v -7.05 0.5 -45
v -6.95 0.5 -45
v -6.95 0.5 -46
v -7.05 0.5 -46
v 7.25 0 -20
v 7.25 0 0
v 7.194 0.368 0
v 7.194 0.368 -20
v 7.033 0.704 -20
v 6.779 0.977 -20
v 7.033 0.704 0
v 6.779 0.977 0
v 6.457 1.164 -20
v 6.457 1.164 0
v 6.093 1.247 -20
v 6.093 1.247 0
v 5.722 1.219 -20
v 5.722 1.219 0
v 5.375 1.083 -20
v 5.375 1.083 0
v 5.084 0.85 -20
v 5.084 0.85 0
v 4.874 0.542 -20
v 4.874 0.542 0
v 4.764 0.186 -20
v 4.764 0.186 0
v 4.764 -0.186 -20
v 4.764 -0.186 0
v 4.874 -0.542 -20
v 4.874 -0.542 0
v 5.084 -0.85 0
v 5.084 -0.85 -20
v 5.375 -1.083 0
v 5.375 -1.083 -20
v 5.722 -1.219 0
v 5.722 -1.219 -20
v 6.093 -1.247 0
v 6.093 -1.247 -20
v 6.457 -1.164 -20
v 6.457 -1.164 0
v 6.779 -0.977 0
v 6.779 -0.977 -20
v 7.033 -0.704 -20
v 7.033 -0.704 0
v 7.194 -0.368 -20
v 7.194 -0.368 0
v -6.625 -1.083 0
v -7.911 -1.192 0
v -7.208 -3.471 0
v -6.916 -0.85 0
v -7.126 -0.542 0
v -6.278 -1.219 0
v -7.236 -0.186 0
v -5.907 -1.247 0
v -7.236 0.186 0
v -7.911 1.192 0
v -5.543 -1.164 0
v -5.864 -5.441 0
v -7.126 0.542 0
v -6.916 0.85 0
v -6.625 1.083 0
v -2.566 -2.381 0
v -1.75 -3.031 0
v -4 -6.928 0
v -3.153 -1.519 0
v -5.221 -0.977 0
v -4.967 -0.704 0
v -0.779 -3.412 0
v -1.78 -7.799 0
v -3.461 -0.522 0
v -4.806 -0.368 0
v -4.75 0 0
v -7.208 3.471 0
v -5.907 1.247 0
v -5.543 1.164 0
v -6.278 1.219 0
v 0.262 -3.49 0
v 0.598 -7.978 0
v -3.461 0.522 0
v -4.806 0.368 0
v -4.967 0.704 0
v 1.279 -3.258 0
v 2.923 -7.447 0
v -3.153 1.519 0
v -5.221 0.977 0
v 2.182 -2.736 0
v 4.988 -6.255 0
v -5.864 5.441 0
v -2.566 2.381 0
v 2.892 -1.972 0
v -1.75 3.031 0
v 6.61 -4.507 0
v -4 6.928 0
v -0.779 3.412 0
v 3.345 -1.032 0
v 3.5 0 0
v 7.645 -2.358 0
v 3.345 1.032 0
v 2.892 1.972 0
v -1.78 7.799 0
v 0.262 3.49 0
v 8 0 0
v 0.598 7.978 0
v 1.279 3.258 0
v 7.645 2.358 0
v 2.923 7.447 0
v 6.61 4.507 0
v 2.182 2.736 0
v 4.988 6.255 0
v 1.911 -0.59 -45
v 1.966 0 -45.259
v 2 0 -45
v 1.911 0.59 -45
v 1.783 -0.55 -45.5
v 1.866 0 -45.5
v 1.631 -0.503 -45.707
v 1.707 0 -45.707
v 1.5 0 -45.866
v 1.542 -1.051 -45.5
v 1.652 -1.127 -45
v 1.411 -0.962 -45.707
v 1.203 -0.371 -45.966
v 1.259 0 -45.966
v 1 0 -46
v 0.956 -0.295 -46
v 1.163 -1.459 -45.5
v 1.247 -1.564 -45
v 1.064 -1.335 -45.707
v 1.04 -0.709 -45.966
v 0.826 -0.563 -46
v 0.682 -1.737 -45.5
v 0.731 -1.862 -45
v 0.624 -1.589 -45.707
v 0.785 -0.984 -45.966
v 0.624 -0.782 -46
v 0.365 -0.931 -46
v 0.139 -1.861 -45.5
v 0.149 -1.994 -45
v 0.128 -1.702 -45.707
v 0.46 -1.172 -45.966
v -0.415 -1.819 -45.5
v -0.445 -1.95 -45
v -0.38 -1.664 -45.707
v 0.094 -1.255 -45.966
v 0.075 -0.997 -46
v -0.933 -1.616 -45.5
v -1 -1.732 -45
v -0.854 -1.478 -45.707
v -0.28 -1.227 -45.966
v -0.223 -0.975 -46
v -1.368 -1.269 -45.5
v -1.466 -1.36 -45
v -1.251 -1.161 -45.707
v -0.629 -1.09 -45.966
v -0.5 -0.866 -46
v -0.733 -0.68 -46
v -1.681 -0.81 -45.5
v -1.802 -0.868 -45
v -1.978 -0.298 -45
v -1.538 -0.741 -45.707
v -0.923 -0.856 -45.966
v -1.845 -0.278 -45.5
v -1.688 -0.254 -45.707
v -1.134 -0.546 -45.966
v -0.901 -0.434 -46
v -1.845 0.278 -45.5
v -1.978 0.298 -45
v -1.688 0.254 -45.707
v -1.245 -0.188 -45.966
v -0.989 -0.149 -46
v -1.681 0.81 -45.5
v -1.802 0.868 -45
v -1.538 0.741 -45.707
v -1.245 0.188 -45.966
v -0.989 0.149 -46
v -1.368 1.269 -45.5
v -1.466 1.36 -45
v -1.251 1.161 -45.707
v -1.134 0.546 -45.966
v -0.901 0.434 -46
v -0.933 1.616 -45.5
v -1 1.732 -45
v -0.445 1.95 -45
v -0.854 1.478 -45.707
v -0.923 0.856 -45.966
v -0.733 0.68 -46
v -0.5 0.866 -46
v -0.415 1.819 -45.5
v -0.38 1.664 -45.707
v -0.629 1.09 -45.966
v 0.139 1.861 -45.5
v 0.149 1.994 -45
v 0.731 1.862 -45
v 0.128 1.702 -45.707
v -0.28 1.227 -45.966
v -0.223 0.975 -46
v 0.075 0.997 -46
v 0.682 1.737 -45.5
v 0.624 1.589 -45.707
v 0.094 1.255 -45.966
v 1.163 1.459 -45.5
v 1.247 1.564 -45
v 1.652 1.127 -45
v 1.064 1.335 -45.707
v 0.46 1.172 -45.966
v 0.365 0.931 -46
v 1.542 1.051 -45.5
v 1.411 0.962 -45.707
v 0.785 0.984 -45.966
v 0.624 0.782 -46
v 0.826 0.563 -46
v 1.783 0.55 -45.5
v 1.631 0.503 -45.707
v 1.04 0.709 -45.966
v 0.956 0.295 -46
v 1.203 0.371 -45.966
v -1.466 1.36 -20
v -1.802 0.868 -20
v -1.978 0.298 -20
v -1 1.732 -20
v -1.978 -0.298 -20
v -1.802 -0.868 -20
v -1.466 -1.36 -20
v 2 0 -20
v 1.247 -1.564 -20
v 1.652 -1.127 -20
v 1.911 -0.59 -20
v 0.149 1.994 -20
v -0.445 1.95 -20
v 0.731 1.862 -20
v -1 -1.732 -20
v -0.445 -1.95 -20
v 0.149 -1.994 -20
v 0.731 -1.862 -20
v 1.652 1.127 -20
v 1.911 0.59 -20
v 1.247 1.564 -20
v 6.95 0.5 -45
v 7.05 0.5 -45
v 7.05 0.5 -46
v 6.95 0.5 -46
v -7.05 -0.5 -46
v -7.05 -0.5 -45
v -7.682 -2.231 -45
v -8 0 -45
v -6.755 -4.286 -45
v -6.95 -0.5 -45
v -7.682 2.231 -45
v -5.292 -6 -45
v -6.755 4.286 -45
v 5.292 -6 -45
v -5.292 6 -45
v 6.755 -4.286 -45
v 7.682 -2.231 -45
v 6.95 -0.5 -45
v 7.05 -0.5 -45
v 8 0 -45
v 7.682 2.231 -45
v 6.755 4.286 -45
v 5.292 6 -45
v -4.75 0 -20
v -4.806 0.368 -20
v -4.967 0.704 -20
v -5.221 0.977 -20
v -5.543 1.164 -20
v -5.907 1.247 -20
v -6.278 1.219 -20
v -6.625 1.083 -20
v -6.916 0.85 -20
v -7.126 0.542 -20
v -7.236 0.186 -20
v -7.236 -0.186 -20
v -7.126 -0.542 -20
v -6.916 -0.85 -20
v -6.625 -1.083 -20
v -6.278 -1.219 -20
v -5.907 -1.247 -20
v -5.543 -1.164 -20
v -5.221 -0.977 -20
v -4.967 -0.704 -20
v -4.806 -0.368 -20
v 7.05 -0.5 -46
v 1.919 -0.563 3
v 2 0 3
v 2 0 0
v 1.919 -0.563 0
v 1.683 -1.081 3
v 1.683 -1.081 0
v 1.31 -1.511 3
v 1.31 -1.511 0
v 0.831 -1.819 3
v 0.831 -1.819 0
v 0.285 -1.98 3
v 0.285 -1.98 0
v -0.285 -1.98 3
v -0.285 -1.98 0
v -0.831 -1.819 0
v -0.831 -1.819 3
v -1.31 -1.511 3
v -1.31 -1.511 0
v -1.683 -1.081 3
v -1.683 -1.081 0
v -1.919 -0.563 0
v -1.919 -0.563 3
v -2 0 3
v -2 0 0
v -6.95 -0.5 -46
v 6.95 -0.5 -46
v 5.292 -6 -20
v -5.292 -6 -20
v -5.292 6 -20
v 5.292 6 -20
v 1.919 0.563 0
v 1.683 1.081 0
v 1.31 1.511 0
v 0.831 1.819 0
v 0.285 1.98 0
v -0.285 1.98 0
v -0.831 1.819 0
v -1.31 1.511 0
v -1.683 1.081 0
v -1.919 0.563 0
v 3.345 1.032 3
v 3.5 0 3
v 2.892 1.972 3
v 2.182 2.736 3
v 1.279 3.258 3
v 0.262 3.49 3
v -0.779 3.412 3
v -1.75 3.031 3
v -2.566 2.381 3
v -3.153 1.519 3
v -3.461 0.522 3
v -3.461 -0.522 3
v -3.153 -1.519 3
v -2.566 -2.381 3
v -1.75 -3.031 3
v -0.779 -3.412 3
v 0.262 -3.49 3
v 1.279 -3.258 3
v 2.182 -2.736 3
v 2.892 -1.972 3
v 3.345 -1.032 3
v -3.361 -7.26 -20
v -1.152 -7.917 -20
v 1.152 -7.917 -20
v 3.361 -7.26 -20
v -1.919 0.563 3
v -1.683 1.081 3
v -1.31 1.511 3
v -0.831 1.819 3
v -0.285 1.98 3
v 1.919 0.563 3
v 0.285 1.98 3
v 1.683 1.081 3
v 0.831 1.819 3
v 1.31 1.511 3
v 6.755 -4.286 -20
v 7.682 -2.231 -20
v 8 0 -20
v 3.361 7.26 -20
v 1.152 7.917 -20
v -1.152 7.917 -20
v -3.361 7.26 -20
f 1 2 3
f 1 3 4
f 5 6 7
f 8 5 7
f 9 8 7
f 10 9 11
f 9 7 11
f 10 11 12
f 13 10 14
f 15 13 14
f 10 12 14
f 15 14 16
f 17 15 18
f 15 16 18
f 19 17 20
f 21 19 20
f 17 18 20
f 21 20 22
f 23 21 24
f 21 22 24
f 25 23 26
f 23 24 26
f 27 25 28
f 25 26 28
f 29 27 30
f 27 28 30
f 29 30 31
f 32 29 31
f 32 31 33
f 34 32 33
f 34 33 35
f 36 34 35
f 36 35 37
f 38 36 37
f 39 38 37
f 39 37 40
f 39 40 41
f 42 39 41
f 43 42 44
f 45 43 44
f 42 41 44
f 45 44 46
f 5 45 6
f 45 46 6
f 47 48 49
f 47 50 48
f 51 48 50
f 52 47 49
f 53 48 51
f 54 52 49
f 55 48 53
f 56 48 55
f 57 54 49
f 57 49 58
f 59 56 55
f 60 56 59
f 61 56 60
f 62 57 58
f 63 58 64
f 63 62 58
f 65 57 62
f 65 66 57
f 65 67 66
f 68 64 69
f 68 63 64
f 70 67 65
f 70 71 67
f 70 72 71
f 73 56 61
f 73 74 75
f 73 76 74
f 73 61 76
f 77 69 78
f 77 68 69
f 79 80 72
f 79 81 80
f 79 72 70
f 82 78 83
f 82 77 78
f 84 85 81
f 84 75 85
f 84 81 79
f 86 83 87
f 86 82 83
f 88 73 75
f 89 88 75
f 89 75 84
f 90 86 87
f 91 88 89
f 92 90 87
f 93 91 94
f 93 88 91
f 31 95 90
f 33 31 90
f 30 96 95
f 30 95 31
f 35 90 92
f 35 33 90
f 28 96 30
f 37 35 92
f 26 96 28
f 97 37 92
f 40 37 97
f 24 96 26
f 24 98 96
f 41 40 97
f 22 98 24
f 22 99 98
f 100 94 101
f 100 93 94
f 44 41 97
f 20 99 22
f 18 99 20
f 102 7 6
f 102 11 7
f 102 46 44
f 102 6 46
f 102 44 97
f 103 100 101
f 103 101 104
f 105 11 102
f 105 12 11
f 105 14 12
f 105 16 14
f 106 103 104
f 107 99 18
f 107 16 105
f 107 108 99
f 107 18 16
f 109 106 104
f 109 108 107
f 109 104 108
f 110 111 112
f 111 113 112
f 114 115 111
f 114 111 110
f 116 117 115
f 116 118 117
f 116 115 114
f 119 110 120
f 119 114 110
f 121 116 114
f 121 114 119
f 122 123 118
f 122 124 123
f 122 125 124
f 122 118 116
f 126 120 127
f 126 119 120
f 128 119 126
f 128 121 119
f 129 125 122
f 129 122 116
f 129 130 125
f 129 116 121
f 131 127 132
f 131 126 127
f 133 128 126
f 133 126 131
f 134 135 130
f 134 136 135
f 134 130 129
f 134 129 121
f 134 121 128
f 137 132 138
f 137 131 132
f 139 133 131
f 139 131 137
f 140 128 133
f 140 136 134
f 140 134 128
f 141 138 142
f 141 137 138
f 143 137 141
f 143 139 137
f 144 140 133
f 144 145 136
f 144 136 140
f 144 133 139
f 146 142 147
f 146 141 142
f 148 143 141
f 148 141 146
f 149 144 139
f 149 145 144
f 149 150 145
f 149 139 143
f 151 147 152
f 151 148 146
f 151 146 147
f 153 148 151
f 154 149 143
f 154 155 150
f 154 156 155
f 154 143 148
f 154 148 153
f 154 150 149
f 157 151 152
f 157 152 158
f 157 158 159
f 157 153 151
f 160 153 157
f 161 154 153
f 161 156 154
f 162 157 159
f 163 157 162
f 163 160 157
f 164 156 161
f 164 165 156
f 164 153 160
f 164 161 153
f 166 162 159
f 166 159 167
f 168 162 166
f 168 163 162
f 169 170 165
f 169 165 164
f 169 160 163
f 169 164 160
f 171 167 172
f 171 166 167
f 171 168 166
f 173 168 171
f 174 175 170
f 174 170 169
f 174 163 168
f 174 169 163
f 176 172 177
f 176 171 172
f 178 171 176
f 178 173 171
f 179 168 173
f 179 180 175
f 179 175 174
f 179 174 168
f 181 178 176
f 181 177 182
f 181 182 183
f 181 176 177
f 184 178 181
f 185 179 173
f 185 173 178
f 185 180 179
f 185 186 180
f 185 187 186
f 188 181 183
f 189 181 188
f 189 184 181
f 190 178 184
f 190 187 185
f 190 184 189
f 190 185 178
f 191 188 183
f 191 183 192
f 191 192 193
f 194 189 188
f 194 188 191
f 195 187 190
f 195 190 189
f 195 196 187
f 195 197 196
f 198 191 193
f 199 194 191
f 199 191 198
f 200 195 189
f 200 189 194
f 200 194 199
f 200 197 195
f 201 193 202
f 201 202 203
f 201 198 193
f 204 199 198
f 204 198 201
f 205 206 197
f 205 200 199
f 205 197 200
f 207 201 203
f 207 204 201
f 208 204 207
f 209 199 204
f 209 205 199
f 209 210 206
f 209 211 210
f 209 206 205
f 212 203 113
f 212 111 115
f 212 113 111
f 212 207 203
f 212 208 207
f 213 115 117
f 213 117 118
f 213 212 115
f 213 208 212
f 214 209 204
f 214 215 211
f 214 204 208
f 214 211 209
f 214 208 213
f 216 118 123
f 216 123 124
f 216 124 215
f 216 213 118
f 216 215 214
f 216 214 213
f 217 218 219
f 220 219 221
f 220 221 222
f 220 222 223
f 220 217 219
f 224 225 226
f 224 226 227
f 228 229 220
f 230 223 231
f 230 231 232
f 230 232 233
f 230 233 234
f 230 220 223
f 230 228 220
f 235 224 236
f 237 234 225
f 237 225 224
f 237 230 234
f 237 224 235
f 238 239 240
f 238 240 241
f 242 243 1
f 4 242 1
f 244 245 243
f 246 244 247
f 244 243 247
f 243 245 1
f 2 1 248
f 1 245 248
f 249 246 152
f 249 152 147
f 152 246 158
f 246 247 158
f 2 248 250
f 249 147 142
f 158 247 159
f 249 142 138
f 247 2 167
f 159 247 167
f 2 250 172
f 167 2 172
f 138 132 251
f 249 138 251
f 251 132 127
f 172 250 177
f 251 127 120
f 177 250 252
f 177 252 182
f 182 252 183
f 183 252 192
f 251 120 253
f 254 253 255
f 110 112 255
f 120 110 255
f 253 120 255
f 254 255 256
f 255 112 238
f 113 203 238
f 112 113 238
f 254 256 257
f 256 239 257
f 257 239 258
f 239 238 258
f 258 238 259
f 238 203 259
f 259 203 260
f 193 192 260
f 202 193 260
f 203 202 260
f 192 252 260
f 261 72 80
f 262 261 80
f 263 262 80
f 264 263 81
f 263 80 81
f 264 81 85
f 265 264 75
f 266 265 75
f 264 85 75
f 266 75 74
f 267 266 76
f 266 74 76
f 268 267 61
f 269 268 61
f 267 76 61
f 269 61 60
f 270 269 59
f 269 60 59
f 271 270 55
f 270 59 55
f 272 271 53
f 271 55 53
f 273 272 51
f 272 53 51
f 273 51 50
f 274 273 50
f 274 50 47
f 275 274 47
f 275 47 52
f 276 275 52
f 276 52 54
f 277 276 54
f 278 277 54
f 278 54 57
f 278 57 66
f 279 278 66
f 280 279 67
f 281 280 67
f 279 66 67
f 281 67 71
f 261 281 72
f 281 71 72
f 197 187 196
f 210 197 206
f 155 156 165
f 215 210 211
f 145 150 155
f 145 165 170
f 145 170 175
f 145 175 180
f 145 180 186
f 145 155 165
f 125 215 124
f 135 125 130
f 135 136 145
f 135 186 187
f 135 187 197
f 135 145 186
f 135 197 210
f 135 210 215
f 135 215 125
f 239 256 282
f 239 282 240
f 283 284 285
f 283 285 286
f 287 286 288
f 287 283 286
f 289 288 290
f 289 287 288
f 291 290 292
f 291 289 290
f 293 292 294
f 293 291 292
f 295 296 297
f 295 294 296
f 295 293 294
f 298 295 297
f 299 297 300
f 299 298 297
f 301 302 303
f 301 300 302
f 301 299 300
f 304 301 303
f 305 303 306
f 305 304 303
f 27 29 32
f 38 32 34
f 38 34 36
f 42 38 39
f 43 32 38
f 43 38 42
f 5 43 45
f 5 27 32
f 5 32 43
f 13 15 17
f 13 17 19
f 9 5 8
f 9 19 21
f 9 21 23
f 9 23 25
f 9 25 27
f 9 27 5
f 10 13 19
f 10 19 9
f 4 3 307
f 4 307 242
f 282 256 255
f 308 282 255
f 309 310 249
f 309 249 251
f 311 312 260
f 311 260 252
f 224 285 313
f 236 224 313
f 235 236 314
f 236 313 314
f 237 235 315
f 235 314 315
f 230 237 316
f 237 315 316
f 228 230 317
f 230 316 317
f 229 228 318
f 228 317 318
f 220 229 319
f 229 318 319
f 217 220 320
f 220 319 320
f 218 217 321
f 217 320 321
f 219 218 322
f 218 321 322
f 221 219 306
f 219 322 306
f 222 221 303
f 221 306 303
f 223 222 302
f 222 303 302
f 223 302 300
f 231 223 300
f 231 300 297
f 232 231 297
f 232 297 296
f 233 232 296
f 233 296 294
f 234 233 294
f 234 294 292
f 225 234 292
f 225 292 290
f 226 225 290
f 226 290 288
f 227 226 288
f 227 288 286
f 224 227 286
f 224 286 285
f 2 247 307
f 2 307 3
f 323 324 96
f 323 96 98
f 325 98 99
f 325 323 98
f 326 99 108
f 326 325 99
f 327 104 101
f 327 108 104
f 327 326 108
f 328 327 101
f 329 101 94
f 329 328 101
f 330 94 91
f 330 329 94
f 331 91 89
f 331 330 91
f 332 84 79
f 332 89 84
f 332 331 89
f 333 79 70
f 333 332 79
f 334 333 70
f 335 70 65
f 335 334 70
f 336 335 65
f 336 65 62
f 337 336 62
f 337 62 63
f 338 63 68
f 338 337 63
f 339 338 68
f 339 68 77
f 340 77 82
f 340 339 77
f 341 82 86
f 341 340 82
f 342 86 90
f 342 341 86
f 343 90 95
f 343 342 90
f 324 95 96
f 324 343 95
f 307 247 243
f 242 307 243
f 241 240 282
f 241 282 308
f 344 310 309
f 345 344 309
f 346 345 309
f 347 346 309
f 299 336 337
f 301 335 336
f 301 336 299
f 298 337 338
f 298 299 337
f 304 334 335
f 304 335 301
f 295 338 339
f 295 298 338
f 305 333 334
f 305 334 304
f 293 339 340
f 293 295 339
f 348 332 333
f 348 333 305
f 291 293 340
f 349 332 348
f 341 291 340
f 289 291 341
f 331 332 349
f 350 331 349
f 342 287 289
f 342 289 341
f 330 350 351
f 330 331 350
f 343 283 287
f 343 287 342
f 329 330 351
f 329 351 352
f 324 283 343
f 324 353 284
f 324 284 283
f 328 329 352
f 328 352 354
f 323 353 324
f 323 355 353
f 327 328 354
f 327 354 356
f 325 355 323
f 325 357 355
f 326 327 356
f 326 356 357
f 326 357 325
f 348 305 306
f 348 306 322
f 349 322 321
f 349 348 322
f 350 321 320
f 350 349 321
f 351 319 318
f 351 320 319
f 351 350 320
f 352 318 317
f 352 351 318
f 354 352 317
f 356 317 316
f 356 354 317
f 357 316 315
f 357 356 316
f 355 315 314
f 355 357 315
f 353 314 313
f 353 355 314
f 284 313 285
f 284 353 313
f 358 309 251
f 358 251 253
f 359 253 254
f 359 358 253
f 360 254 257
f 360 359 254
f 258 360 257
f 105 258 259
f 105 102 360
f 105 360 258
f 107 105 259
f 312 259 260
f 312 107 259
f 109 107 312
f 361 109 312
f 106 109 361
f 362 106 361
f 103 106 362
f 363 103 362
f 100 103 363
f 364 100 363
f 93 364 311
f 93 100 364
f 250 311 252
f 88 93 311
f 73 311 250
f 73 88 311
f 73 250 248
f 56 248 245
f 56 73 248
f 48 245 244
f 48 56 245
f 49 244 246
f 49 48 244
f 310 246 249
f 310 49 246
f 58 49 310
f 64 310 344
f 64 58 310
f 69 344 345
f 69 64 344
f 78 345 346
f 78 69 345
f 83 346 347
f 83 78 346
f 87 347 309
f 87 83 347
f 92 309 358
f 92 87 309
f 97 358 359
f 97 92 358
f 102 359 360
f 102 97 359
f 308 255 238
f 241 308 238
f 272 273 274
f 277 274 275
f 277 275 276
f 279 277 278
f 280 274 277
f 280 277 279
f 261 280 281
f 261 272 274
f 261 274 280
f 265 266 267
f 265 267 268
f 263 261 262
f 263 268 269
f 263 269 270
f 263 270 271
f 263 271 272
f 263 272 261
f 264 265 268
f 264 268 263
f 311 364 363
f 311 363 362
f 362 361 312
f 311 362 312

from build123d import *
from build123d.topology import SkipClean

# Parameters (mm, degrees)
SKETCH1_R           = 8
SKETCH1_R_2         = 2
SKETCH1_R_3         = 1.25
BOSS_EXTRUDE1_DEPTH = 20
BOSS_EXTRUDE2_START = 3
BOSS_EXTRUDE2_DEPTH = 3
BOSS_EXTRUDE3_DEPTH = 25
SKETCH3_R           = 2
SKETCH3_W           = 0.1
SKETCH3_H           = 1
BOSS_EXTRUDE5_DEPTH = 1
FILLET2_R           = 1


with BuildPart() as part:
    # Sketch1 → Boss-Extrude1 (new body)
    with BuildSketch(Plane.XY):
        Circle(SKETCH1_R)
        Circle(SKETCH1_R_2, mode=Mode.SUBTRACT)
        with Locations((-6, 0)):
            Circle(SKETCH1_R_3, mode=Mode.SUBTRACT)
        with Locations((6, 0)):
            Circle(SKETCH1_R_3, mode=Mode.SUBTRACT)
    extrude(amount=-BOSS_EXTRUDE1_DEPTH)

    # Sketch1<3> → Boss-Extrude2 (add)
    with SkipClean():  # the faces are left unmerged after this step: merging them gives an invalid solid
        with BuildSketch(Plane.XY.offset(BOSS_EXTRUDE2_START)):
            with BuildLine():
                ThreePointArc((-2, 0), (0, 2), (2, 0))
                Line((2, 0), (3.5, 0))
                ThreePointArc((3.5, 0), (0, 3.5), (-3.5, 0))
                Line((-3.5, 0), (-2, 0))
            make_face()
            with BuildLine():
                Line((3.5, 0), (2, 0))
                ThreePointArc((2, 0), (0, -2), (-2, 0))
                Line((-2, 0), (-3.5, 0))
                ThreePointArc((-3.5, 0), (0, -3.5), (3.5, 0))
            make_face()
        extrude(amount=-BOSS_EXTRUDE2_DEPTH)

    # Sketch2 → Boss-Extrude3 (add)
    with SkipClean():  # the faces are left unmerged after this step: merging them gives an invalid solid
        with BuildSketch(Plane(origin=(0, 0, -20), x_dir=(-1, 0, 0), z_dir=(0, 0, -1))):
            with BuildLine():
                Line((-5.291502622, 6), (5.291502622, 6))
                ThreePointArc((5.291502622, 6), (8, 0), (5.291502622, -6))
                Line((5.291502622, -6), (-5.291502622, -6))
                ThreePointArc((-5.291502622, -6), (-8, 0), (-5.291502622, 6))
            make_face()
        extrude(amount=BOSS_EXTRUDE3_DEPTH)

    # Sketch3 → Boss-Extrude5 (add)
    with SkipClean():  # the faces are left unmerged after this step: merging them gives an invalid solid
        with BuildSketch(Plane(origin=(0, 0, -45), x_dir=(-1, 0, 0), z_dir=(0, 0, -1))):
            with Locations(Location((0, 0, 0), (0, 0, 180))):
                Circle(SKETCH3_R)
            with Locations((7, 0)):
                Rectangle(SKETCH3_W, SKETCH3_H)
            with Locations((-7, 0)):
                Rectangle(SKETCH3_W, SKETCH3_H)
        extrude(amount=BOSS_EXTRUDE5_DEPTH)

    # Fillet2
    fillet2_edges = [part.edges().sort_by_distance(p)[0] for p in [
        (-2, 0, -46),
    ]]
    fillet(fillet2_edges, radius=FILLET2_R - 0.0001)  # a hair under: the kernel refuses the full size


solid = part.part
